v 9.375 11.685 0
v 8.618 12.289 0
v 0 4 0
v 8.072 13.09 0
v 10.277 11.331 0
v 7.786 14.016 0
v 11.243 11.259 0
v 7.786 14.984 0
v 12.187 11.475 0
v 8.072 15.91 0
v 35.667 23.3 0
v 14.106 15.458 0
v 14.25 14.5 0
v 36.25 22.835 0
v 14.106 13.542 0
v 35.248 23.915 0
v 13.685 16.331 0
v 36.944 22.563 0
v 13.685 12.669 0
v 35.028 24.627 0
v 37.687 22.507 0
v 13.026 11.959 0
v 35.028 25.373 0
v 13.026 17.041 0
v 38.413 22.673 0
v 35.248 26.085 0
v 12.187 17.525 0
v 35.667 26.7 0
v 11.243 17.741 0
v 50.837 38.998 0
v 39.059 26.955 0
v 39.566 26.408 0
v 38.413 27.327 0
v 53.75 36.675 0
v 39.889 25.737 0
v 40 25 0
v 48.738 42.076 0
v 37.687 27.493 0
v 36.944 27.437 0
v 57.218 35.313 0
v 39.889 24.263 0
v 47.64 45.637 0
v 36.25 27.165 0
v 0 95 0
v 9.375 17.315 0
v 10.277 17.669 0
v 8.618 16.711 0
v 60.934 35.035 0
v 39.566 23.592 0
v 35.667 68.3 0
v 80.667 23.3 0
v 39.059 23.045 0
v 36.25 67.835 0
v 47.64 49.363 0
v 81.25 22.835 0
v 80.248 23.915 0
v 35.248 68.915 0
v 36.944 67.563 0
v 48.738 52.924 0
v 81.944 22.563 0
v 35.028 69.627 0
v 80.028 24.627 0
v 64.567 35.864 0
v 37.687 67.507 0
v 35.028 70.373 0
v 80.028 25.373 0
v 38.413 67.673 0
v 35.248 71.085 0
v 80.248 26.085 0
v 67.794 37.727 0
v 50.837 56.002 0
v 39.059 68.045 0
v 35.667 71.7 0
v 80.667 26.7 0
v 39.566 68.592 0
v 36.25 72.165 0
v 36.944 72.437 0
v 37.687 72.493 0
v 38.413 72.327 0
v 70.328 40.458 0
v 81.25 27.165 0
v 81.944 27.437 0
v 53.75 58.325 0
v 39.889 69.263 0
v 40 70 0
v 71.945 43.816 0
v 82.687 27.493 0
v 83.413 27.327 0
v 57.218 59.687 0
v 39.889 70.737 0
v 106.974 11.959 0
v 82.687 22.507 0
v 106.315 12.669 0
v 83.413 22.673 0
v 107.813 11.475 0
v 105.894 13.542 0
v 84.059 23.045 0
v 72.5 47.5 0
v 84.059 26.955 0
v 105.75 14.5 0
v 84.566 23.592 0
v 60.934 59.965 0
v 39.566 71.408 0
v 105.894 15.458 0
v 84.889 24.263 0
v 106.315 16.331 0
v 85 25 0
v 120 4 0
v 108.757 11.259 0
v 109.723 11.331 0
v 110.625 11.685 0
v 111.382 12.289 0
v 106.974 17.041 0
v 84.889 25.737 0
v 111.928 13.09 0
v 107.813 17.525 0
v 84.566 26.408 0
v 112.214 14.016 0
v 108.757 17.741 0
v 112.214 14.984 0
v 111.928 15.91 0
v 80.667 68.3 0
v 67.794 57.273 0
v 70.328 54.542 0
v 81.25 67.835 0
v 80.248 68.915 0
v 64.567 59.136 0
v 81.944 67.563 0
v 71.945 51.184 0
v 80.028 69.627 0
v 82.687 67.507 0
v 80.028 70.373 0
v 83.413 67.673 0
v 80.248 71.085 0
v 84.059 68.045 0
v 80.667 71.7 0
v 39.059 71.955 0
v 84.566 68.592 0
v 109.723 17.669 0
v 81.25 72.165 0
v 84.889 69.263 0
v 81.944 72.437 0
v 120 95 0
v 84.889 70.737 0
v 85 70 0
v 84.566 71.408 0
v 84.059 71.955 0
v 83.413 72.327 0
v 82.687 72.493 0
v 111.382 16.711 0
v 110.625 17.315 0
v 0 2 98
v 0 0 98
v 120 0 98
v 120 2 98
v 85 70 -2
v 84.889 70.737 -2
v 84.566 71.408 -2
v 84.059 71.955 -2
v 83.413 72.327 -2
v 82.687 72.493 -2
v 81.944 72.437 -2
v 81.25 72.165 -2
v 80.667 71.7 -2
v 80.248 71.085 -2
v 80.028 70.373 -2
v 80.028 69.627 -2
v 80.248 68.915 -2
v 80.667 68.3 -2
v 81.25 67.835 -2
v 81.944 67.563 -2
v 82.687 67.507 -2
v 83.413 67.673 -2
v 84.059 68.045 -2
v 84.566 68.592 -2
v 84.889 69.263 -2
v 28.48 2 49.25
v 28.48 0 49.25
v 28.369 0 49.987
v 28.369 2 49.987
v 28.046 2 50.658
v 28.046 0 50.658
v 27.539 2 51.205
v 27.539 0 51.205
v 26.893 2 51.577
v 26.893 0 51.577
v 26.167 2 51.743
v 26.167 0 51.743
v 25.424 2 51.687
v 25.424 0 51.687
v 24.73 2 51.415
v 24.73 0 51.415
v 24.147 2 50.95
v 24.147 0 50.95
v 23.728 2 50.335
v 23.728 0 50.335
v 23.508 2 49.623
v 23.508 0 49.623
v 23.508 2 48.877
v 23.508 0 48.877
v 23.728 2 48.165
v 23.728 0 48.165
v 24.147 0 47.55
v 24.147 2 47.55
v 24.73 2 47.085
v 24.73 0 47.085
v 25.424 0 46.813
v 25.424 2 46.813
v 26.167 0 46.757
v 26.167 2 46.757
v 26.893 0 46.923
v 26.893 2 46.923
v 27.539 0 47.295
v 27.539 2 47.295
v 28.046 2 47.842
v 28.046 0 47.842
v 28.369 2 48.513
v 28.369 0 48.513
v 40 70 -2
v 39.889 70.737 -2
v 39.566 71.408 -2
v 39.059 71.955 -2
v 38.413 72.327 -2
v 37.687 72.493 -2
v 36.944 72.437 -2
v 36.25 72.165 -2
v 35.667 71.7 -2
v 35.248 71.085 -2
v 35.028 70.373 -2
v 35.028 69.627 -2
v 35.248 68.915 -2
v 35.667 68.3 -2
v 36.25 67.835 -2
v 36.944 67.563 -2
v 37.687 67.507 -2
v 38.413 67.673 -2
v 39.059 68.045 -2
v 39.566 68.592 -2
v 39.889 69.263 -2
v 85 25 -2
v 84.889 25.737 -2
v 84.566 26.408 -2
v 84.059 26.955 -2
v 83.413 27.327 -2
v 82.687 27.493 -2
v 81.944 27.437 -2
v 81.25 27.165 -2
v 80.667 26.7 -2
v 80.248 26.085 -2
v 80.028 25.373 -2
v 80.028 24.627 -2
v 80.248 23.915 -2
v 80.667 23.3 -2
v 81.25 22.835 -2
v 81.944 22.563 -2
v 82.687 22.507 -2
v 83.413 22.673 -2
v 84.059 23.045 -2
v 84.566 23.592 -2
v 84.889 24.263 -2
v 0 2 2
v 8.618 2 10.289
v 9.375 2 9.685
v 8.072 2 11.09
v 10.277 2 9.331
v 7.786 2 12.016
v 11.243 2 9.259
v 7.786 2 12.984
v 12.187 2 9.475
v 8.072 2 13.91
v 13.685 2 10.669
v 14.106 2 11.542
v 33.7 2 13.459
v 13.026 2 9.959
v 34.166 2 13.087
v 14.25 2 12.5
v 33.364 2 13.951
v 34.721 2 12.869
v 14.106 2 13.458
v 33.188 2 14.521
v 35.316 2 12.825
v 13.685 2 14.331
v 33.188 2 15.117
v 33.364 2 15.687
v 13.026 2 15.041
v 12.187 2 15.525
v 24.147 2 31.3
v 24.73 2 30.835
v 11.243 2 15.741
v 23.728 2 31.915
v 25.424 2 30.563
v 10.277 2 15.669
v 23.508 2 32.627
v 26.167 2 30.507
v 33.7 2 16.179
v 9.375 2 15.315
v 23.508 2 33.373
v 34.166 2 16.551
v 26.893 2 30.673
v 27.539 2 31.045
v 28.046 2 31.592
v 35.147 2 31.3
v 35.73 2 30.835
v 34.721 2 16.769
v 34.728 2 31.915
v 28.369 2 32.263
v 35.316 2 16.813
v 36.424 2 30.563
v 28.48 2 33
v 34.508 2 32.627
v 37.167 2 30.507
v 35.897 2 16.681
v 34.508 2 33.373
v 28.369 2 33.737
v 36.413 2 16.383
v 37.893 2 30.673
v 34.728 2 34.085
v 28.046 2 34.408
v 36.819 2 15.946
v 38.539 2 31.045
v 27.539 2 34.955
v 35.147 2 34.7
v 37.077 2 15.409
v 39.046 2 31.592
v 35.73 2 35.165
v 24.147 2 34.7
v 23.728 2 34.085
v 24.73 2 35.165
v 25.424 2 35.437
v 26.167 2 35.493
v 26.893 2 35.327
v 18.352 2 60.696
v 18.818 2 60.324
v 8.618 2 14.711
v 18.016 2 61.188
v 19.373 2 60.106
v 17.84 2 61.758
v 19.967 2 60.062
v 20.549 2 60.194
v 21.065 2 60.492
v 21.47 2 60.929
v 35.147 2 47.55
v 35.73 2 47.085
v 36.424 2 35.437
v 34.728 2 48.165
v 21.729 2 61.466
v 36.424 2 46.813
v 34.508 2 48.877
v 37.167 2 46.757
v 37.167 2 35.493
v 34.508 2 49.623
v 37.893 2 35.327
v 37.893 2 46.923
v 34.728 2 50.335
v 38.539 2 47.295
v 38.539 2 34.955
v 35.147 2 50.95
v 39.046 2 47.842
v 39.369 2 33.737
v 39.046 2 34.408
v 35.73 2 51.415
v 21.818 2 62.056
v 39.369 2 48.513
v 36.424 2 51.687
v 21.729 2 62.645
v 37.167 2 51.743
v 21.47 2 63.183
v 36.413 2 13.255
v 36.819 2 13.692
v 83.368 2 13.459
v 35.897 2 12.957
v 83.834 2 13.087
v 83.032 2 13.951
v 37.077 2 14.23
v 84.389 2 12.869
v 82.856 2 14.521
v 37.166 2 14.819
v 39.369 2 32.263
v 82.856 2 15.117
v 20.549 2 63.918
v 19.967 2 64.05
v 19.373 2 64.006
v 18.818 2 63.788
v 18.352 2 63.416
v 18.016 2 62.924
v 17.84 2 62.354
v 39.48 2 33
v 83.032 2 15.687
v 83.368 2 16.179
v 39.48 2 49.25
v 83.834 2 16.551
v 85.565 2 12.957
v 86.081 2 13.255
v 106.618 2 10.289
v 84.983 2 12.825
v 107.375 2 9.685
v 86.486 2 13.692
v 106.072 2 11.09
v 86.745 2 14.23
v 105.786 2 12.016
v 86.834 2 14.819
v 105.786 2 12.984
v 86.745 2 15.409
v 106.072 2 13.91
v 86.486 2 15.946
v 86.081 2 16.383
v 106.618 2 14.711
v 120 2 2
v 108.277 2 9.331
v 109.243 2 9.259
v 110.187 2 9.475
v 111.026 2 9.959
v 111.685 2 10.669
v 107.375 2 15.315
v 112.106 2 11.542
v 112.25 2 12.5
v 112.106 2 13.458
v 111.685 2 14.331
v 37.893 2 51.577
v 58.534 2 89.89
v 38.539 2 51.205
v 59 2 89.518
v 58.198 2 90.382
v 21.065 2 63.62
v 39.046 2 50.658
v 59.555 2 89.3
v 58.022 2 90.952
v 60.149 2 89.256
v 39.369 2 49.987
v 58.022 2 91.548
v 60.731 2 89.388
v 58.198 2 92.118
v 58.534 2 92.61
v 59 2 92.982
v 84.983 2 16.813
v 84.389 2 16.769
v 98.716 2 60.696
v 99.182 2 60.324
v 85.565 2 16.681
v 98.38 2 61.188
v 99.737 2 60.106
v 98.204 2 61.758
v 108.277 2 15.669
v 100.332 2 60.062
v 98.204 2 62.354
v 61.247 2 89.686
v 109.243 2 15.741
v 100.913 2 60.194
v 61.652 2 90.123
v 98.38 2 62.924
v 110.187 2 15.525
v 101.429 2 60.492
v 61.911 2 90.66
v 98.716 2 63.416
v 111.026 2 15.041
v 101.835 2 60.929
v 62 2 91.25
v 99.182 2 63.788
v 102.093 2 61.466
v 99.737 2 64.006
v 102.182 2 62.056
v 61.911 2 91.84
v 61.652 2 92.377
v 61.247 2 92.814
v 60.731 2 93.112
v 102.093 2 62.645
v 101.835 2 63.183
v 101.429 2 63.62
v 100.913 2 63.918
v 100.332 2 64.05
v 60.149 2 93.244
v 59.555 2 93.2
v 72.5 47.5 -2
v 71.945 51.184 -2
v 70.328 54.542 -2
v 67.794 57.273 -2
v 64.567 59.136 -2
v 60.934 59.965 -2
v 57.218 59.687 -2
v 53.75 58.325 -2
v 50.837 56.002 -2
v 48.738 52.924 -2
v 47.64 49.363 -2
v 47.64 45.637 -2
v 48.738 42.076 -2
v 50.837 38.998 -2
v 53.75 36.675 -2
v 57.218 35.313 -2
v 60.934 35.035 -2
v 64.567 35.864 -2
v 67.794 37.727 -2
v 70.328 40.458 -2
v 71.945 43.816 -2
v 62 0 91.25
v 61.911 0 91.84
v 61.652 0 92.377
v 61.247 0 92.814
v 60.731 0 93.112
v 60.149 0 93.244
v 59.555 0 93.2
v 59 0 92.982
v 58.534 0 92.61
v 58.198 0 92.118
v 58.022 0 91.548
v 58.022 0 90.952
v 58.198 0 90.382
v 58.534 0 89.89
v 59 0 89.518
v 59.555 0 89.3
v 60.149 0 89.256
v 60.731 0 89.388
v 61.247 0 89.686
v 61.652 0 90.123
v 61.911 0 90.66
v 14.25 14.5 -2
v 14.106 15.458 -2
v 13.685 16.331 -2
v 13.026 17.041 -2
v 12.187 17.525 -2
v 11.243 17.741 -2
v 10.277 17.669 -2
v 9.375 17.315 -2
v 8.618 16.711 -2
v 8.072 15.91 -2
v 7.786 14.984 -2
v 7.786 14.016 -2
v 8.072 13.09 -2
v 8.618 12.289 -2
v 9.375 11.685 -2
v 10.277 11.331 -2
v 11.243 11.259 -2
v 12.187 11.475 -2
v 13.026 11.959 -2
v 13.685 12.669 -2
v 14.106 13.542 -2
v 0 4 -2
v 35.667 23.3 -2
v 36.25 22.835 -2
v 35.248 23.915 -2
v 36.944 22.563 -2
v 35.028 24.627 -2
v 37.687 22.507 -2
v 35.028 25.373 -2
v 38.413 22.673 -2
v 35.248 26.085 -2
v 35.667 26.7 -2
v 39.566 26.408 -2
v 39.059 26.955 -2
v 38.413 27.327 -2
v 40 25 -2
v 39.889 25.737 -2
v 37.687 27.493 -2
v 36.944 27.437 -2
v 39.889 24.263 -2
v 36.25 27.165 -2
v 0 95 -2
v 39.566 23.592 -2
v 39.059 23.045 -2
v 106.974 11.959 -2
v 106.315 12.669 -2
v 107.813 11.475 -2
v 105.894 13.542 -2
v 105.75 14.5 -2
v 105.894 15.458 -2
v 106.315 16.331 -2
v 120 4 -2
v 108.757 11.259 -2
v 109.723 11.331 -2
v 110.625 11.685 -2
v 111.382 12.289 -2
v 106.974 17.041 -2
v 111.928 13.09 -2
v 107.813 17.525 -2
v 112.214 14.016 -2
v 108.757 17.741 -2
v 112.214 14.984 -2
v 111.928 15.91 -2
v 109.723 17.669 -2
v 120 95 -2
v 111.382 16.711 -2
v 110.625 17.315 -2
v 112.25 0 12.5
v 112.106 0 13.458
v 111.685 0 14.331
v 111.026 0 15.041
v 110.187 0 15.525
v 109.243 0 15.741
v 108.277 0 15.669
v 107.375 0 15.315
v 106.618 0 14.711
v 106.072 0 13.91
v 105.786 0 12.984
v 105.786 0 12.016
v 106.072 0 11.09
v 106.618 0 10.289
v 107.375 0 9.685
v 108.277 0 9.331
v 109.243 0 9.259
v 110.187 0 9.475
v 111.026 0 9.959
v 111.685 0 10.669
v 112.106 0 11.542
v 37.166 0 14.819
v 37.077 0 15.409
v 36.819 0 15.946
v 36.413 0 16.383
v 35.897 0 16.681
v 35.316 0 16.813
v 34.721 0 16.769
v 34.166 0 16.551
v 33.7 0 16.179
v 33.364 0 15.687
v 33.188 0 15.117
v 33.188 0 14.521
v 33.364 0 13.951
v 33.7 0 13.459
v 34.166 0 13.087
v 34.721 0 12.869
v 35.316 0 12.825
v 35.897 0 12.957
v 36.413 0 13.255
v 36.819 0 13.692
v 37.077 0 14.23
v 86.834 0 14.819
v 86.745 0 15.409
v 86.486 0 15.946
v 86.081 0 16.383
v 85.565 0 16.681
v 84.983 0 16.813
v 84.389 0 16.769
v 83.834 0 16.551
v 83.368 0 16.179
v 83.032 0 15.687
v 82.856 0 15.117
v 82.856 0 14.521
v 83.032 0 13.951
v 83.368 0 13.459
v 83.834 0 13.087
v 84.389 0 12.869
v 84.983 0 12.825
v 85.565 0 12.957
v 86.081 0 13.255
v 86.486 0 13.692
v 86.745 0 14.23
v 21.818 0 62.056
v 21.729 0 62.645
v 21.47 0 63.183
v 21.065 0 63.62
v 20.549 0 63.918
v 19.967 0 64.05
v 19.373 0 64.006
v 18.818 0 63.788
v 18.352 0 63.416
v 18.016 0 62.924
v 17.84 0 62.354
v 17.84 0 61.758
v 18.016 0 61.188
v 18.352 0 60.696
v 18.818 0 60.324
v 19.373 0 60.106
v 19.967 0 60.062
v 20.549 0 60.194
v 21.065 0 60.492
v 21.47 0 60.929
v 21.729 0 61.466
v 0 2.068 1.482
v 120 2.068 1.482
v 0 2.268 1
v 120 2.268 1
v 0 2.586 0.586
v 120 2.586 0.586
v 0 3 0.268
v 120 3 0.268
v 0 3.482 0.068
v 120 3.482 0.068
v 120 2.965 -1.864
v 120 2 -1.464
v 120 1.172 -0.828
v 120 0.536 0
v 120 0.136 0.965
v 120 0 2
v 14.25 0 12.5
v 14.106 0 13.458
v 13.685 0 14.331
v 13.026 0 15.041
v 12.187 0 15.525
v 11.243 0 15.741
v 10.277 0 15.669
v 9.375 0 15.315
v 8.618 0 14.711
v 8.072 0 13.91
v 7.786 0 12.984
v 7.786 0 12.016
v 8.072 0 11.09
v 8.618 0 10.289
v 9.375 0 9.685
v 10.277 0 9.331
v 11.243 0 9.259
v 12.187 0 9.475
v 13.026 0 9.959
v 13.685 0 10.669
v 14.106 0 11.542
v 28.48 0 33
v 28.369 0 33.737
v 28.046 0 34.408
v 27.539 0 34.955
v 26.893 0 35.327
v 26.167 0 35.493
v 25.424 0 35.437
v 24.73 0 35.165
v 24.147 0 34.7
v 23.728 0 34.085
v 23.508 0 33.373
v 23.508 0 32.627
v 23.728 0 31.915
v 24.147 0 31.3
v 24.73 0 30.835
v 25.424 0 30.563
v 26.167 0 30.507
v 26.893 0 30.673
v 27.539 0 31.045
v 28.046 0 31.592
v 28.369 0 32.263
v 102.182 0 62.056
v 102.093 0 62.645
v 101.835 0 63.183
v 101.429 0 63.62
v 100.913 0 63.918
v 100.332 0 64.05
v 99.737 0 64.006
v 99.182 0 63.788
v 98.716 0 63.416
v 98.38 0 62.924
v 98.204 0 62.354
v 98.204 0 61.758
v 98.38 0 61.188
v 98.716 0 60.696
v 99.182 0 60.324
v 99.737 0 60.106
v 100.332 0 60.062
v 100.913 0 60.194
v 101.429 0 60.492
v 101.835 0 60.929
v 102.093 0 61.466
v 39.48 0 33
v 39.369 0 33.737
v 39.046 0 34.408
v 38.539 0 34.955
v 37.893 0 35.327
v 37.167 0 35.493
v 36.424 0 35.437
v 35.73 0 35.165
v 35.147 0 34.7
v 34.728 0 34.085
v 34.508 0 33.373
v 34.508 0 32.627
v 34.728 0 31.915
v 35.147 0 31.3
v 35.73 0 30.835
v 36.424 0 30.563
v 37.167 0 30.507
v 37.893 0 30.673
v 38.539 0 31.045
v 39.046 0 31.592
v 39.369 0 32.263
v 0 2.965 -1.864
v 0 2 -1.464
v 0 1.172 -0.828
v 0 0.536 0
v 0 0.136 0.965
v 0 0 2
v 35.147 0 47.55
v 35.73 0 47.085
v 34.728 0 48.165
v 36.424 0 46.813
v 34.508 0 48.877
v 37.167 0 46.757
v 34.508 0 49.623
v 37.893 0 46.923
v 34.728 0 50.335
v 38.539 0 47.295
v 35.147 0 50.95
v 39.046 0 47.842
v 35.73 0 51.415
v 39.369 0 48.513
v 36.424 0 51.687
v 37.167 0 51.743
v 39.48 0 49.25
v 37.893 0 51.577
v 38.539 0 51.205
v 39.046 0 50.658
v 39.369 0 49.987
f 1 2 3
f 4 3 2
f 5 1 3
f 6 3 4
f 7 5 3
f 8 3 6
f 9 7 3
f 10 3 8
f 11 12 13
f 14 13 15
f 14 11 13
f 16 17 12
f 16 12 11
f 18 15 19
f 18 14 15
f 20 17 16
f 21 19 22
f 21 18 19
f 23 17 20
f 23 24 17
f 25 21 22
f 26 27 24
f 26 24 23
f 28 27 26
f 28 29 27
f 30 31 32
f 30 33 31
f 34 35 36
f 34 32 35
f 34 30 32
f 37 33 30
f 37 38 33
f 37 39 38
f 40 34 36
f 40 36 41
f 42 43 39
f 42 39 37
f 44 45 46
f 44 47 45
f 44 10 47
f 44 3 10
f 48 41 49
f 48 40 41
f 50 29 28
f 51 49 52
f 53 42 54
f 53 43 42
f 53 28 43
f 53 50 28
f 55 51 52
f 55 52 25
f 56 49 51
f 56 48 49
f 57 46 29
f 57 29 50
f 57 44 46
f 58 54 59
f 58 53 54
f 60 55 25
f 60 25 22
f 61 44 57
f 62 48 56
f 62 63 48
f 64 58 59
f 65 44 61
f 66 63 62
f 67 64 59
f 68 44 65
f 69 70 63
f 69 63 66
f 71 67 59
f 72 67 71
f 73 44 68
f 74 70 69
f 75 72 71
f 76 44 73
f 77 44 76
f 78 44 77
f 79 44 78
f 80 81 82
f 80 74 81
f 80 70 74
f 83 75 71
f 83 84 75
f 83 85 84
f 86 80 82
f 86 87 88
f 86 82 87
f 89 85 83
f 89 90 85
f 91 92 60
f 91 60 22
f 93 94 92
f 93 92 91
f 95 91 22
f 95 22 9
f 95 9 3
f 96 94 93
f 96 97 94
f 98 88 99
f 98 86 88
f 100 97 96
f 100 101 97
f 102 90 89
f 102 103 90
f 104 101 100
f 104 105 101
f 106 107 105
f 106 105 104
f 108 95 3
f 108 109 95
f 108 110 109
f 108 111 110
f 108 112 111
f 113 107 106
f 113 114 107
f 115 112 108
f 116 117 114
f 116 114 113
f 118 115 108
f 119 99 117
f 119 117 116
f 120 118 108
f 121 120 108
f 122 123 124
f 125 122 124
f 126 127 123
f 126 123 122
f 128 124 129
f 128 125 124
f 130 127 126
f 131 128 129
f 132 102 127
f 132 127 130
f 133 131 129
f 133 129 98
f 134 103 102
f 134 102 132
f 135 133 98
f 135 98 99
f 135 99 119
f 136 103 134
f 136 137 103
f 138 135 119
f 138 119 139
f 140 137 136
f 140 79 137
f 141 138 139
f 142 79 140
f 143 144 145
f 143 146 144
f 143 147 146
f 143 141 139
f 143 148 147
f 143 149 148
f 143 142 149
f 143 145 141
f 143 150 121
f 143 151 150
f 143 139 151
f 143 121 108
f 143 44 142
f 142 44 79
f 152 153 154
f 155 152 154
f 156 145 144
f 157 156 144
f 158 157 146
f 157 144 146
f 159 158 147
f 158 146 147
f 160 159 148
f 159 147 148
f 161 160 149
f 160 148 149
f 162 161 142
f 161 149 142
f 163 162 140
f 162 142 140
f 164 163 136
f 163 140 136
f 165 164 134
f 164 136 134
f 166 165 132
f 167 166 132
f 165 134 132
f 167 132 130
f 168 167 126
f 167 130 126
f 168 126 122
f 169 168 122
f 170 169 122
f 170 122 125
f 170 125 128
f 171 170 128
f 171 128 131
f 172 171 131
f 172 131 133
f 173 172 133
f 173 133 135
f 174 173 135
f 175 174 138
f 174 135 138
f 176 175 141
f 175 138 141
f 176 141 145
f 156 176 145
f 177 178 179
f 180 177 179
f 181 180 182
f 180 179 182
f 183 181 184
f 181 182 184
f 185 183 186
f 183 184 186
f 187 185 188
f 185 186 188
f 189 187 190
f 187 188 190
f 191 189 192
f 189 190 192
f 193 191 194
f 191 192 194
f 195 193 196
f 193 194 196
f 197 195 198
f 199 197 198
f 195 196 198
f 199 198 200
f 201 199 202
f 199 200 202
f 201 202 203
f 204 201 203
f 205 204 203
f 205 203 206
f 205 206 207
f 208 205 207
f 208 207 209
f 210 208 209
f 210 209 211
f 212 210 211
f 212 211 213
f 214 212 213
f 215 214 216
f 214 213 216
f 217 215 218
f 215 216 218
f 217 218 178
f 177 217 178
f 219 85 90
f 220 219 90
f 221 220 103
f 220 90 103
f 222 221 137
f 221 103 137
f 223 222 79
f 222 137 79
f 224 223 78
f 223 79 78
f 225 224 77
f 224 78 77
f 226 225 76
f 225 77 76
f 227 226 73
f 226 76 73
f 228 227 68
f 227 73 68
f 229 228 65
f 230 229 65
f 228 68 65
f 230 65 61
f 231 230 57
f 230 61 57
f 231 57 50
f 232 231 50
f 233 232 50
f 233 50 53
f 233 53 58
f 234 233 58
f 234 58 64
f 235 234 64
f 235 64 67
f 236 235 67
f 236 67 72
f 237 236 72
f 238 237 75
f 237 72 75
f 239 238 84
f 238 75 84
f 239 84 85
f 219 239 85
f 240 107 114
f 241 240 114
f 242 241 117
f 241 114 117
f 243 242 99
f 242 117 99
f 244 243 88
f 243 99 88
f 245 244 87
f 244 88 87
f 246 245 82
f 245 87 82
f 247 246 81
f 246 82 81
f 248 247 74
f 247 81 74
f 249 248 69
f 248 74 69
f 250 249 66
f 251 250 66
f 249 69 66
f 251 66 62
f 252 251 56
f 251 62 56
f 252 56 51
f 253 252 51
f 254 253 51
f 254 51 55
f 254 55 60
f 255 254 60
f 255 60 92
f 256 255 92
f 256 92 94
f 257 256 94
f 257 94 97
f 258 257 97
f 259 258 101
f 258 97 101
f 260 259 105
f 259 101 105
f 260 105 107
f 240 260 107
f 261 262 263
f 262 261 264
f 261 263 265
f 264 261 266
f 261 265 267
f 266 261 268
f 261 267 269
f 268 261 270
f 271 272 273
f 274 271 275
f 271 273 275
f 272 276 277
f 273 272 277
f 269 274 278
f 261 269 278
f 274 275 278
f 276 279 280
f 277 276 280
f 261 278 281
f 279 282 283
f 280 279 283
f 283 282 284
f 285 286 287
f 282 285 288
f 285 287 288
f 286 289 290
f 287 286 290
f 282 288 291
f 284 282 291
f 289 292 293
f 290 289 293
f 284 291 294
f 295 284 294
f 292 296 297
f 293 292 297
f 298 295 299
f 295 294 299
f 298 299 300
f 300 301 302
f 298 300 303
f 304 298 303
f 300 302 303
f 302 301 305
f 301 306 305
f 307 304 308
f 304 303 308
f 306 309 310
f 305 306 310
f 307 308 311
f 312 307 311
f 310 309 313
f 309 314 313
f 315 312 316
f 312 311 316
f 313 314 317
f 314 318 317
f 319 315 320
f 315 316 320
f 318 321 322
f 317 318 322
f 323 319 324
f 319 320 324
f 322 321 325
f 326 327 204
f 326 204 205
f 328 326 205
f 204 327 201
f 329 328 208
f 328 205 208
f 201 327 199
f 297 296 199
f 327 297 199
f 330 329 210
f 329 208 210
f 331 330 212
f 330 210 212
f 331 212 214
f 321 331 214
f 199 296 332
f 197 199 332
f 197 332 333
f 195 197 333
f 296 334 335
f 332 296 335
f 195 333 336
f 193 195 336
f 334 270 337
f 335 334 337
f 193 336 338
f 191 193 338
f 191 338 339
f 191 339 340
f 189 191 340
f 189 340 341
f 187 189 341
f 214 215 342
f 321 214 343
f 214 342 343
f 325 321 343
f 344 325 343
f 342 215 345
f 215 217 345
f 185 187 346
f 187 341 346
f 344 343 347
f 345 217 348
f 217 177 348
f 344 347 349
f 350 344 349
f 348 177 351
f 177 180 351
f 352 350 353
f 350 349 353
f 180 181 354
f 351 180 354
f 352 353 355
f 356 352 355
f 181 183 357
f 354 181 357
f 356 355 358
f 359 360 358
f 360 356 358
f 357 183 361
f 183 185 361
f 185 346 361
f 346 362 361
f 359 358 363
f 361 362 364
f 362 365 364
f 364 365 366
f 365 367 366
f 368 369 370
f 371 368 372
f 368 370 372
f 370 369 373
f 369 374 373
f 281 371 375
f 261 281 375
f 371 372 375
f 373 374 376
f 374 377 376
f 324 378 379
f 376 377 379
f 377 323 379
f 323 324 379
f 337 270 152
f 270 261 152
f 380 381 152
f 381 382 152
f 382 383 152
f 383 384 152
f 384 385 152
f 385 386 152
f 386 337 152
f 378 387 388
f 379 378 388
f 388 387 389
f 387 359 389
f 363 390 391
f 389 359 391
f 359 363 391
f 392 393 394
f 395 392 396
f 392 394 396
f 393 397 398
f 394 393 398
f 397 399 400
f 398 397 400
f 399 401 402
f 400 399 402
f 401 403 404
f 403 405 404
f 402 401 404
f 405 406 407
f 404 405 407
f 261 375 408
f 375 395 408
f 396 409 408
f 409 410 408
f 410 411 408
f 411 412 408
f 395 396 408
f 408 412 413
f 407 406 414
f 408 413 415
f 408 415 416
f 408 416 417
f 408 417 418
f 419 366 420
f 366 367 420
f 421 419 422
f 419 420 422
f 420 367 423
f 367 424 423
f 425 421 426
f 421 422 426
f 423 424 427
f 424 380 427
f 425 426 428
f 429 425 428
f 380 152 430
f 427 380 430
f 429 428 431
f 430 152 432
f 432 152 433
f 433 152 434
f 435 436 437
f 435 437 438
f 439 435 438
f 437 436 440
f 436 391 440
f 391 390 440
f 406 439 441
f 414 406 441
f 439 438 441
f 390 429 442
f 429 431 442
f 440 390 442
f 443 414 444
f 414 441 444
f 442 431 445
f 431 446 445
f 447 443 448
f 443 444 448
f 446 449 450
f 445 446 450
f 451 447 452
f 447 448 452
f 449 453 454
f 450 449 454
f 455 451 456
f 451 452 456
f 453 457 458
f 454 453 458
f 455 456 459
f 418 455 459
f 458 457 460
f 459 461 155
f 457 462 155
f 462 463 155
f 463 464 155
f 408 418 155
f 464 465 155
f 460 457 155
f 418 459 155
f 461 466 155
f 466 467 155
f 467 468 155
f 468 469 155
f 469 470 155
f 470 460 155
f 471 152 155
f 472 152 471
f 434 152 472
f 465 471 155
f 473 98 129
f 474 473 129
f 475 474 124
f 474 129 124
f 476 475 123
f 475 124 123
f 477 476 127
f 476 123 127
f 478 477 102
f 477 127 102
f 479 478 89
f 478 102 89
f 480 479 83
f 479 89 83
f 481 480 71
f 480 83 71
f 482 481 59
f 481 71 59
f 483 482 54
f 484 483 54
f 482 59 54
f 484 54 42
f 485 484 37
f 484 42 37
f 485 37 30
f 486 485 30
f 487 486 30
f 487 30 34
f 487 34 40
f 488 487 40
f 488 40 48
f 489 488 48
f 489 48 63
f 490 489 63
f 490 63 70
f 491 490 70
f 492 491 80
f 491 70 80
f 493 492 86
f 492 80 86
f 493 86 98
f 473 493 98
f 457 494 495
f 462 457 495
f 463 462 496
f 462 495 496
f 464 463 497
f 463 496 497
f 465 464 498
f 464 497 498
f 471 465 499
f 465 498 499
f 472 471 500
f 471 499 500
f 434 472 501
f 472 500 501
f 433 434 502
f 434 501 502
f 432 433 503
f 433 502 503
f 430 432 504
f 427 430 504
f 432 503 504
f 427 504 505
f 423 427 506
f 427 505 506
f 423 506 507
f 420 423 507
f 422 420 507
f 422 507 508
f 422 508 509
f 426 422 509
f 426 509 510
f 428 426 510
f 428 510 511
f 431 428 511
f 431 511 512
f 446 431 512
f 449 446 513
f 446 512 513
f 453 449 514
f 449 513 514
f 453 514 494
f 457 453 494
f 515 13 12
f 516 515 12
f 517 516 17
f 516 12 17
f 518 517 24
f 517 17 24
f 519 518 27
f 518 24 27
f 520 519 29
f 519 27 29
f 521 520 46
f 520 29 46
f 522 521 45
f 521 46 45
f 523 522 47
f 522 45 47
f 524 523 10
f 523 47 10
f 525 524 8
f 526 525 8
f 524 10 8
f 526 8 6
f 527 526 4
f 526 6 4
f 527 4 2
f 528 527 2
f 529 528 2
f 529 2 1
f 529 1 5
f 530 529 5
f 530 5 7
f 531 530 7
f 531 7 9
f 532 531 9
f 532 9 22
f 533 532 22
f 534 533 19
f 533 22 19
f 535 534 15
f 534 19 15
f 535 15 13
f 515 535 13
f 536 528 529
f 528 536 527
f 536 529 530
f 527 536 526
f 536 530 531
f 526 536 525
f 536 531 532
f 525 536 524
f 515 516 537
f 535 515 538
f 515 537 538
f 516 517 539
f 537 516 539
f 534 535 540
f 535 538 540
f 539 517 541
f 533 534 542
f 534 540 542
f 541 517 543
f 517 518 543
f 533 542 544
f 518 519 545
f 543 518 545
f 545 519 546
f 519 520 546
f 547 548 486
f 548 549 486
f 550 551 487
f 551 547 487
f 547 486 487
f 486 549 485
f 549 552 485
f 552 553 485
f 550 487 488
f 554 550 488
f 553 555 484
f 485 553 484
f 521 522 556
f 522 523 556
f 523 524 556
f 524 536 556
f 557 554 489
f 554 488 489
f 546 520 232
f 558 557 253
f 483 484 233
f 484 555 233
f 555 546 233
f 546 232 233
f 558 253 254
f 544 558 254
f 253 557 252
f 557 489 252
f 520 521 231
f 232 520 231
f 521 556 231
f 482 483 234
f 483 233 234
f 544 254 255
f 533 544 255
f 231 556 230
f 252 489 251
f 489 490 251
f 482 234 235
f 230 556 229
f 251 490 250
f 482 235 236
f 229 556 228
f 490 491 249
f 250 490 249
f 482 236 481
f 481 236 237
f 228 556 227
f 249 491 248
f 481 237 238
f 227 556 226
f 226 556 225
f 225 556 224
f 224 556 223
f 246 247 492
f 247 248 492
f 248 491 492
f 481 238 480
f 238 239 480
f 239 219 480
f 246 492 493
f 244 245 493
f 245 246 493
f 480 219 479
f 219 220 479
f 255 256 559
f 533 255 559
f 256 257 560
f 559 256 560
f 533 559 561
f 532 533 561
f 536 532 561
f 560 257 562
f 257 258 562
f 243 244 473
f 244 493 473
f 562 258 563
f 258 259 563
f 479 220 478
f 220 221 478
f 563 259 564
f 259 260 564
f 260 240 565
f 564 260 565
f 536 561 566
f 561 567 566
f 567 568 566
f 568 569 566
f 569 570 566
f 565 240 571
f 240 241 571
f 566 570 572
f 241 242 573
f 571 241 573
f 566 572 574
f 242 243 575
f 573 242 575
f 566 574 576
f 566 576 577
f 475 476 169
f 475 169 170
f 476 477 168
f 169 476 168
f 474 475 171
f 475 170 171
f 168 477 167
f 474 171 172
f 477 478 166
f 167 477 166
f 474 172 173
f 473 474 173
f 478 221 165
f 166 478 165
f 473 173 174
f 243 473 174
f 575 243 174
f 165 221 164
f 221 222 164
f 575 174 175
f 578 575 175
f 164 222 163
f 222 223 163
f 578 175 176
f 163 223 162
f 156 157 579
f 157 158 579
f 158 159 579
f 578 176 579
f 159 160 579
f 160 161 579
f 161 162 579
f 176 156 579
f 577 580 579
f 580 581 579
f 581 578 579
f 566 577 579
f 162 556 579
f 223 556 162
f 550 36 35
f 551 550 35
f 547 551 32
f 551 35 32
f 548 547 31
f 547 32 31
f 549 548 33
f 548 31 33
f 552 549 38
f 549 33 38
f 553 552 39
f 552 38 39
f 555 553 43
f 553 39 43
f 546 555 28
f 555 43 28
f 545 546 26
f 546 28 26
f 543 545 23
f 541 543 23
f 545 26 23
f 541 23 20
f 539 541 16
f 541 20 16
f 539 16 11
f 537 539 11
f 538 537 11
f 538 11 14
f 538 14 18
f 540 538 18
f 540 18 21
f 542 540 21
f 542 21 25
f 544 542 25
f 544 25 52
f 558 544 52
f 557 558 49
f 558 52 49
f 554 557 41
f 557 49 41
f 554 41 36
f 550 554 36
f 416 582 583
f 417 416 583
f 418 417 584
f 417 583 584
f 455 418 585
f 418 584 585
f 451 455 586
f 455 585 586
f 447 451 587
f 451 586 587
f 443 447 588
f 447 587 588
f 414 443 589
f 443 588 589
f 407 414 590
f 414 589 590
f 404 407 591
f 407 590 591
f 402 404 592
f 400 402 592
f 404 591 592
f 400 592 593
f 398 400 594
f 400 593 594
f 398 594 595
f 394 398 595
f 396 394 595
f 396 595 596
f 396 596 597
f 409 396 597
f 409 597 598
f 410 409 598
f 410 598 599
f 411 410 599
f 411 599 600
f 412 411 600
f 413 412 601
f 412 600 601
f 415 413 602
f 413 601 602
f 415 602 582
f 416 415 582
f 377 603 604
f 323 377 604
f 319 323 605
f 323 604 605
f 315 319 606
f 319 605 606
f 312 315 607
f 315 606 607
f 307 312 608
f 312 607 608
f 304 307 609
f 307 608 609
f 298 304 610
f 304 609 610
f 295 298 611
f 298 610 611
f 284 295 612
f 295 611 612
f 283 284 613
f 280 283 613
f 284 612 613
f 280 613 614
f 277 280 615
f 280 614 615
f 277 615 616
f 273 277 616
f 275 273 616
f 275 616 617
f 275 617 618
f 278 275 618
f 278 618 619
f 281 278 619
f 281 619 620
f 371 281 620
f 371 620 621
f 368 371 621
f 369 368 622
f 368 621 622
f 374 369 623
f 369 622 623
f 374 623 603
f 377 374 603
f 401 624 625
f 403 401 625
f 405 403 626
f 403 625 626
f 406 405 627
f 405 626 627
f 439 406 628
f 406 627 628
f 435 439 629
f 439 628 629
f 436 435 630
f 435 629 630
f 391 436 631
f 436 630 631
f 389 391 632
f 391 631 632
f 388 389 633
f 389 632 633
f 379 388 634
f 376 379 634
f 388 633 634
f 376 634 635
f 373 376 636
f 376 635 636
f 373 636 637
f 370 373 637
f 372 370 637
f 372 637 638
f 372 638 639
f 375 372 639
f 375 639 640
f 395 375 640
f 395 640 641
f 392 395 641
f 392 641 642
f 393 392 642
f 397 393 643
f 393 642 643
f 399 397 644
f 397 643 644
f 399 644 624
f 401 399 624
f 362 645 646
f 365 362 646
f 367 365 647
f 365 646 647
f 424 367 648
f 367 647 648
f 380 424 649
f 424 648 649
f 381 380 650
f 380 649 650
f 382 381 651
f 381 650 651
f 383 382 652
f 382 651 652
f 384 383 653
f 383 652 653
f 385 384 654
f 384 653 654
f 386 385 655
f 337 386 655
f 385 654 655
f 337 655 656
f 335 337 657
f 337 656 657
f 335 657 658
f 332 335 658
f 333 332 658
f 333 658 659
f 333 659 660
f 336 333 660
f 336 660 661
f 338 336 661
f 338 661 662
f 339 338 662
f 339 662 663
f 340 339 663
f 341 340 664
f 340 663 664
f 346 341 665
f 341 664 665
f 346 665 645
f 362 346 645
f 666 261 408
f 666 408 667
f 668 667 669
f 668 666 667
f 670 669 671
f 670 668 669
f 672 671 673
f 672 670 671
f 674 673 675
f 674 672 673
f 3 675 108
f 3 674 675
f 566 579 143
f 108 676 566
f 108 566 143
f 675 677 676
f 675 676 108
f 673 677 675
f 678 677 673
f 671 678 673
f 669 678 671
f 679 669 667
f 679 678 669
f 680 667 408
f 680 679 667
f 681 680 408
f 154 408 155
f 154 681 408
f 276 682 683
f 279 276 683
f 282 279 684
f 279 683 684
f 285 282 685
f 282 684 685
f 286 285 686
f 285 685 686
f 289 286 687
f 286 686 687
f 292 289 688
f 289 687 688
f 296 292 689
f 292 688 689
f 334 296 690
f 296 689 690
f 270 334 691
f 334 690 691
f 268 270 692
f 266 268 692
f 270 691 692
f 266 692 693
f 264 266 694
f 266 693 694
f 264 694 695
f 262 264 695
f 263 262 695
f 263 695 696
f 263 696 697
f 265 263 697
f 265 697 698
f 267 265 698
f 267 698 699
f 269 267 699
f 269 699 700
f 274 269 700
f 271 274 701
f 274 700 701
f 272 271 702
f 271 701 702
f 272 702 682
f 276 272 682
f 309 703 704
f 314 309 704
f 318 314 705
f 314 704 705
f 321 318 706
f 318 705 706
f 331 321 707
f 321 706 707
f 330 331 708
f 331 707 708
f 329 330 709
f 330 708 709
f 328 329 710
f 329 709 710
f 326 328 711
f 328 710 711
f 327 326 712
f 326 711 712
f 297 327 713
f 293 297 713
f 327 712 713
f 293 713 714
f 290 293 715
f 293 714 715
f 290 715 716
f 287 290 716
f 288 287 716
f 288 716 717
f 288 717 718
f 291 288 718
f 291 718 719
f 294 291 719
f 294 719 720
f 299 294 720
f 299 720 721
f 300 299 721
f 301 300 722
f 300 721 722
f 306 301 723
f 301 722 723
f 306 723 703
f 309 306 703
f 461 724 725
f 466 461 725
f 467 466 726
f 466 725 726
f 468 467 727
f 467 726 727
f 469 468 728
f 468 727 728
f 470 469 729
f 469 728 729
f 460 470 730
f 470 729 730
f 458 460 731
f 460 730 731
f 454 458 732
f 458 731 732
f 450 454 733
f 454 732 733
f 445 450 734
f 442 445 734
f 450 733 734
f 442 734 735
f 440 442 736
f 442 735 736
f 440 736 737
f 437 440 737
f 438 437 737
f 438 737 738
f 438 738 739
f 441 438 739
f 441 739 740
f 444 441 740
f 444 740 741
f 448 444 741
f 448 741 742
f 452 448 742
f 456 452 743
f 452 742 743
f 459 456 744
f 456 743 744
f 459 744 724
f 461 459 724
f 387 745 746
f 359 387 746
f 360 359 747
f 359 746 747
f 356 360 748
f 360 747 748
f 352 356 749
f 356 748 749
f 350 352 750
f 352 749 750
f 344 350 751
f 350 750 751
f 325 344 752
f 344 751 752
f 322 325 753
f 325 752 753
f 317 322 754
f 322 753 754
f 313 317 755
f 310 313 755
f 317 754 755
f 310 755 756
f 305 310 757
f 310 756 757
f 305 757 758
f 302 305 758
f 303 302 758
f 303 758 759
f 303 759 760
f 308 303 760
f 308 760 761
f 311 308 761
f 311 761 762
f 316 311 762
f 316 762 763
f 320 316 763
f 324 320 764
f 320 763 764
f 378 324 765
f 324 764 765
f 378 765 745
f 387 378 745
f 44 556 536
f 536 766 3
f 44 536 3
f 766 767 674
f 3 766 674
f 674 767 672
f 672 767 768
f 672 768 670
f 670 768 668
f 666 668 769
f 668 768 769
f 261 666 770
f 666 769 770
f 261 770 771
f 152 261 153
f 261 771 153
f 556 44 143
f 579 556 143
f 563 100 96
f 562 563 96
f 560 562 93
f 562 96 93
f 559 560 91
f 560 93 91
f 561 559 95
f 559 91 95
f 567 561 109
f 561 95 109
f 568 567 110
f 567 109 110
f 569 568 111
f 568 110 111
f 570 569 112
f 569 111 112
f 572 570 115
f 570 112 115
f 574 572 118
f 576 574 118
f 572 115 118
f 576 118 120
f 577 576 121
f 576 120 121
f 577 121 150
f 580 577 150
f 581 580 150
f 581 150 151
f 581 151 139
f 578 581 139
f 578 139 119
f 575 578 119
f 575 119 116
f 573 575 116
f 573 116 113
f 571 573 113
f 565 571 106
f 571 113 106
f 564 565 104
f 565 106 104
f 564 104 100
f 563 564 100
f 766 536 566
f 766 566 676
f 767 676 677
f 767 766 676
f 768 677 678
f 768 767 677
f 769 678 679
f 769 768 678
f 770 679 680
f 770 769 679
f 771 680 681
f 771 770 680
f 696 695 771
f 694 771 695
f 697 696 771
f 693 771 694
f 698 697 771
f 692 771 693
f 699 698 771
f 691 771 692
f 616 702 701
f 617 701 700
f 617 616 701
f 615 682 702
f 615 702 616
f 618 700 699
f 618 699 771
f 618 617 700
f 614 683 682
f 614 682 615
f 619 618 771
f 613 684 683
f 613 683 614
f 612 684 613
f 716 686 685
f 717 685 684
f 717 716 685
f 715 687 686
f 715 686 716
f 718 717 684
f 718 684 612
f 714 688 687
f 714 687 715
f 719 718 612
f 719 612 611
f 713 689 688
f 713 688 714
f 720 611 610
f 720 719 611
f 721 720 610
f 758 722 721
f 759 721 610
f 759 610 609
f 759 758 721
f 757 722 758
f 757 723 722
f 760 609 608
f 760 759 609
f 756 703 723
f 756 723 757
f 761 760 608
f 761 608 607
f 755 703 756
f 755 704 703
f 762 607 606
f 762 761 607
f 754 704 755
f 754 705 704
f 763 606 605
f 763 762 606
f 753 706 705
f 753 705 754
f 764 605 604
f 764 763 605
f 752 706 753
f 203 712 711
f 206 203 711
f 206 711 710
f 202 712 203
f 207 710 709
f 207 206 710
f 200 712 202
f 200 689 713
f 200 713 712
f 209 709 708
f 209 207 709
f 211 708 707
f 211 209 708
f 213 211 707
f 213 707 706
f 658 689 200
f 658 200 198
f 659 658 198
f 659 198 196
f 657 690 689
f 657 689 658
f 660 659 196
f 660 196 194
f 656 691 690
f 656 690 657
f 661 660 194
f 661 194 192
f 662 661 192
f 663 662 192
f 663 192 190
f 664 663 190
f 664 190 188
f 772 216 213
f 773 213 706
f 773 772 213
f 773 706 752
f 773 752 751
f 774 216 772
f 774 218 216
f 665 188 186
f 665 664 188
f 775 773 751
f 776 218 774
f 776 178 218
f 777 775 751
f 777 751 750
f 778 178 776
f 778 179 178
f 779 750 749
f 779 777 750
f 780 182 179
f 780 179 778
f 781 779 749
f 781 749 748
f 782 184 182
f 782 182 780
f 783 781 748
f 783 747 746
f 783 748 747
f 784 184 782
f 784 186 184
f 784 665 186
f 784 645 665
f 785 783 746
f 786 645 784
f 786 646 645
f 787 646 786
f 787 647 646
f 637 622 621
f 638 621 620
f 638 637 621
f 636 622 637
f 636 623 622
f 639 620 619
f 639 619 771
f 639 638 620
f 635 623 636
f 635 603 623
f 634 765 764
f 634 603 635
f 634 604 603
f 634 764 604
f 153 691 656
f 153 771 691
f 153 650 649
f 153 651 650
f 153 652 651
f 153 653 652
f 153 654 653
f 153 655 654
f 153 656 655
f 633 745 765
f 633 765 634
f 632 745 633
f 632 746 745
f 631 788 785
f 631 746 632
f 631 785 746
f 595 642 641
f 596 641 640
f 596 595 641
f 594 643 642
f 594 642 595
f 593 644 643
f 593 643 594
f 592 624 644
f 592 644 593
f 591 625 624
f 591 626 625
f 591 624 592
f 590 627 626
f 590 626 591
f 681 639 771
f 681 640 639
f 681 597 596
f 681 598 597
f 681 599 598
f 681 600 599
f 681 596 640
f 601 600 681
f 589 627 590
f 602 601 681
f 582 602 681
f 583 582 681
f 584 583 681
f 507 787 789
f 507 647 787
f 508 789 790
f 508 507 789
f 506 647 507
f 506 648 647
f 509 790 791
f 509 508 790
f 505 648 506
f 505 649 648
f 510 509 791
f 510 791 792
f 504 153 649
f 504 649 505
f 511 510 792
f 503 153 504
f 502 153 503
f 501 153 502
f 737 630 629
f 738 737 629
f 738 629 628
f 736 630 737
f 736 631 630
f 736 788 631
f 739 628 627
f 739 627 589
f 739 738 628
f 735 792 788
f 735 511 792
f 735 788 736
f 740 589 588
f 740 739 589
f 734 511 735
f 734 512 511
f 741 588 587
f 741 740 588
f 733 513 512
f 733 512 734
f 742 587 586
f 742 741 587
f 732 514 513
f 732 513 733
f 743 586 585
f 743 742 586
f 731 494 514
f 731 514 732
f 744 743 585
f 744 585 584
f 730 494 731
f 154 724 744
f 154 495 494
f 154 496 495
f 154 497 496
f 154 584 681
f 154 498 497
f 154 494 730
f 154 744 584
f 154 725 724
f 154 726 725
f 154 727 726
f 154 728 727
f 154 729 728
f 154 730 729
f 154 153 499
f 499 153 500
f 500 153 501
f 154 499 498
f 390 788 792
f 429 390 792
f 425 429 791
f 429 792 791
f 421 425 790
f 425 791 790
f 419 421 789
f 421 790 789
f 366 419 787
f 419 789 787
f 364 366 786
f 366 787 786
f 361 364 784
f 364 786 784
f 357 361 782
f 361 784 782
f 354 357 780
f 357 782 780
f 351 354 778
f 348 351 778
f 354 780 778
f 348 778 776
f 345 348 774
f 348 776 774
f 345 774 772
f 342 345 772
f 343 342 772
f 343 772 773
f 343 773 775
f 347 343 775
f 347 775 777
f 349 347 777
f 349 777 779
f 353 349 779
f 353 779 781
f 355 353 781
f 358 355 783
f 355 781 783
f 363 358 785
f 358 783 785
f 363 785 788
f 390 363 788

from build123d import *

# Parameters (mm, degrees)
SKETCH2_W                    = 120
SKETCH2_H                    = 95
SKETCH2_R                    = 12.5
SKETCH2_R_2                  = 2.5
SKETCH2_R_3                  = 3.25
BASE_FLANGE1_DEPTH           = 2
EDGE_FLANGE1_STRIP_W         = 12
EDGE_FLANGE1_STRIP_H         = 2
EDGE_FLANGE1_STRIP_CUT_DEPTH = 120
EDGE_FLANGE1_DEPTH           = 120
EDGE_FLANGE1_PROFILE_W       = 120
EDGE_FLANGE1_PROFILE_H       = 96
EDGE_FLANGE1_PROFILE_R       = 3.25
EDGE_FLANGE1_PROFILE_R_2     = 2
EDGE_FLANGE1_PROFILE_R_3     = 2.5
EDGE_FLANGE1_FLAT_DEPTH      = 2


# Sheet-metal steps are written as plain solids
with BuildPart() as part:
    # Sketch2 → Base-Flange1 (new body)
    with BuildSketch(Plane.XY):
        with Locations((60, 47.5)):
            Rectangle(SKETCH2_W, SKETCH2_H)
        with Locations((60, 47.5)):
            Circle(SKETCH2_R, mode=Mode.SUBTRACT)
        with Locations((82.5, 70)):
            Circle(SKETCH2_R_2, mode=Mode.SUBTRACT)
        with Locations((37.5, 70)):
            Circle(SKETCH2_R_2, mode=Mode.SUBTRACT)
        with Locations((37.5, 25)):
            Circle(SKETCH2_R_2, mode=Mode.SUBTRACT)
        with Locations((82.5, 25)):
            Circle(SKETCH2_R_2, mode=Mode.SUBTRACT)
        with Locations((11, 14.5)):
            Circle(SKETCH2_R_3, mode=Mode.SUBTRACT)
        with Locations(Location((109, 14.5, 0), (0, 0, 180))):
            Circle(SKETCH2_R_3, mode=Mode.SUBTRACT)
    extrude(amount=-BASE_FLANGE1_DEPTH)

    # Edge-Flange1 strip (across the edge) → Edge-Flange1 strip cut (cut)
    with BuildSketch(Plane.YZ):
        with Locations((-2, -1)):
            Rectangle(EDGE_FLANGE1_STRIP_W, EDGE_FLANGE1_STRIP_H)
    extrude(amount=EDGE_FLANGE1_STRIP_CUT_DEPTH, mode=Mode.SUBTRACT)

    # Edge-Flange1 bend section (across the edge) → Edge-Flange1 (add)
    with BuildSketch(Plane.YZ):
        with BuildLine():
            Line((0, 2), (2, 2))
            ThreePointArc((2, 2), (2.585786438, 0.585786438), (4, 0))
            Line((4, 0), (4, -2))
            ThreePointArc((4, -2), (1.171572875, -0.828427125), (0, 2))
        make_face()
    extrude(amount=EDGE_FLANGE1_DEPTH)

    # Edge-Flange1 profile (on flange) → Edge-Flange1 flat (add)
    with BuildSketch(Plane.XZ):
        with Locations((60, 50)):
            Rectangle(EDGE_FLANGE1_PROFILE_W, EDGE_FLANGE1_PROFILE_H)
        with Locations((11, 12.5)):
            Circle(EDGE_FLANGE1_PROFILE_R, mode=Mode.SUBTRACT)
        with Locations((35.166073091, 14.819031988)):
            Circle(EDGE_FLANGE1_PROFILE_R_2, mode=Mode.SUBTRACT)
        with Locations((25.98, 33)):
            Circle(EDGE_FLANGE1_PROFILE_R_3, mode=Mode.SUBTRACT)
        with Locations((25.98, 49.25)):
            Circle(EDGE_FLANGE1_PROFILE_R_3, mode=Mode.SUBTRACT)
        with Locations((36.98, 33)):
            Circle(EDGE_FLANGE1_PROFILE_R_3, mode=Mode.SUBTRACT)
        with Locations((36.98, 49.25)):
            Circle(EDGE_FLANGE1_PROFILE_R_3, mode=Mode.SUBTRACT)
        with Locations((84.833926909, 14.819031988)):
            Circle(EDGE_FLANGE1_PROFILE_R_2, mode=Mode.SUBTRACT)
        with Locations((109, 12.5)):
            Circle(EDGE_FLANGE1_PROFILE_R, mode=Mode.SUBTRACT)
        with Locations((19.817862187, 62.055968012)):
            Circle(EDGE_FLANGE1_PROFILE_R_2, mode=Mode.SUBTRACT)
        with Locations((100.182137813, 62.055968012)):
            Circle(EDGE_FLANGE1_PROFILE_R_2, mode=Mode.SUBTRACT)
        with Locations((60, 91.25)):
            Circle(EDGE_FLANGE1_PROFILE_R_2, mode=Mode.SUBTRACT)
    extrude(amount=-EDGE_FLANGE1_FLAT_DEPTH)


solid = part.part
